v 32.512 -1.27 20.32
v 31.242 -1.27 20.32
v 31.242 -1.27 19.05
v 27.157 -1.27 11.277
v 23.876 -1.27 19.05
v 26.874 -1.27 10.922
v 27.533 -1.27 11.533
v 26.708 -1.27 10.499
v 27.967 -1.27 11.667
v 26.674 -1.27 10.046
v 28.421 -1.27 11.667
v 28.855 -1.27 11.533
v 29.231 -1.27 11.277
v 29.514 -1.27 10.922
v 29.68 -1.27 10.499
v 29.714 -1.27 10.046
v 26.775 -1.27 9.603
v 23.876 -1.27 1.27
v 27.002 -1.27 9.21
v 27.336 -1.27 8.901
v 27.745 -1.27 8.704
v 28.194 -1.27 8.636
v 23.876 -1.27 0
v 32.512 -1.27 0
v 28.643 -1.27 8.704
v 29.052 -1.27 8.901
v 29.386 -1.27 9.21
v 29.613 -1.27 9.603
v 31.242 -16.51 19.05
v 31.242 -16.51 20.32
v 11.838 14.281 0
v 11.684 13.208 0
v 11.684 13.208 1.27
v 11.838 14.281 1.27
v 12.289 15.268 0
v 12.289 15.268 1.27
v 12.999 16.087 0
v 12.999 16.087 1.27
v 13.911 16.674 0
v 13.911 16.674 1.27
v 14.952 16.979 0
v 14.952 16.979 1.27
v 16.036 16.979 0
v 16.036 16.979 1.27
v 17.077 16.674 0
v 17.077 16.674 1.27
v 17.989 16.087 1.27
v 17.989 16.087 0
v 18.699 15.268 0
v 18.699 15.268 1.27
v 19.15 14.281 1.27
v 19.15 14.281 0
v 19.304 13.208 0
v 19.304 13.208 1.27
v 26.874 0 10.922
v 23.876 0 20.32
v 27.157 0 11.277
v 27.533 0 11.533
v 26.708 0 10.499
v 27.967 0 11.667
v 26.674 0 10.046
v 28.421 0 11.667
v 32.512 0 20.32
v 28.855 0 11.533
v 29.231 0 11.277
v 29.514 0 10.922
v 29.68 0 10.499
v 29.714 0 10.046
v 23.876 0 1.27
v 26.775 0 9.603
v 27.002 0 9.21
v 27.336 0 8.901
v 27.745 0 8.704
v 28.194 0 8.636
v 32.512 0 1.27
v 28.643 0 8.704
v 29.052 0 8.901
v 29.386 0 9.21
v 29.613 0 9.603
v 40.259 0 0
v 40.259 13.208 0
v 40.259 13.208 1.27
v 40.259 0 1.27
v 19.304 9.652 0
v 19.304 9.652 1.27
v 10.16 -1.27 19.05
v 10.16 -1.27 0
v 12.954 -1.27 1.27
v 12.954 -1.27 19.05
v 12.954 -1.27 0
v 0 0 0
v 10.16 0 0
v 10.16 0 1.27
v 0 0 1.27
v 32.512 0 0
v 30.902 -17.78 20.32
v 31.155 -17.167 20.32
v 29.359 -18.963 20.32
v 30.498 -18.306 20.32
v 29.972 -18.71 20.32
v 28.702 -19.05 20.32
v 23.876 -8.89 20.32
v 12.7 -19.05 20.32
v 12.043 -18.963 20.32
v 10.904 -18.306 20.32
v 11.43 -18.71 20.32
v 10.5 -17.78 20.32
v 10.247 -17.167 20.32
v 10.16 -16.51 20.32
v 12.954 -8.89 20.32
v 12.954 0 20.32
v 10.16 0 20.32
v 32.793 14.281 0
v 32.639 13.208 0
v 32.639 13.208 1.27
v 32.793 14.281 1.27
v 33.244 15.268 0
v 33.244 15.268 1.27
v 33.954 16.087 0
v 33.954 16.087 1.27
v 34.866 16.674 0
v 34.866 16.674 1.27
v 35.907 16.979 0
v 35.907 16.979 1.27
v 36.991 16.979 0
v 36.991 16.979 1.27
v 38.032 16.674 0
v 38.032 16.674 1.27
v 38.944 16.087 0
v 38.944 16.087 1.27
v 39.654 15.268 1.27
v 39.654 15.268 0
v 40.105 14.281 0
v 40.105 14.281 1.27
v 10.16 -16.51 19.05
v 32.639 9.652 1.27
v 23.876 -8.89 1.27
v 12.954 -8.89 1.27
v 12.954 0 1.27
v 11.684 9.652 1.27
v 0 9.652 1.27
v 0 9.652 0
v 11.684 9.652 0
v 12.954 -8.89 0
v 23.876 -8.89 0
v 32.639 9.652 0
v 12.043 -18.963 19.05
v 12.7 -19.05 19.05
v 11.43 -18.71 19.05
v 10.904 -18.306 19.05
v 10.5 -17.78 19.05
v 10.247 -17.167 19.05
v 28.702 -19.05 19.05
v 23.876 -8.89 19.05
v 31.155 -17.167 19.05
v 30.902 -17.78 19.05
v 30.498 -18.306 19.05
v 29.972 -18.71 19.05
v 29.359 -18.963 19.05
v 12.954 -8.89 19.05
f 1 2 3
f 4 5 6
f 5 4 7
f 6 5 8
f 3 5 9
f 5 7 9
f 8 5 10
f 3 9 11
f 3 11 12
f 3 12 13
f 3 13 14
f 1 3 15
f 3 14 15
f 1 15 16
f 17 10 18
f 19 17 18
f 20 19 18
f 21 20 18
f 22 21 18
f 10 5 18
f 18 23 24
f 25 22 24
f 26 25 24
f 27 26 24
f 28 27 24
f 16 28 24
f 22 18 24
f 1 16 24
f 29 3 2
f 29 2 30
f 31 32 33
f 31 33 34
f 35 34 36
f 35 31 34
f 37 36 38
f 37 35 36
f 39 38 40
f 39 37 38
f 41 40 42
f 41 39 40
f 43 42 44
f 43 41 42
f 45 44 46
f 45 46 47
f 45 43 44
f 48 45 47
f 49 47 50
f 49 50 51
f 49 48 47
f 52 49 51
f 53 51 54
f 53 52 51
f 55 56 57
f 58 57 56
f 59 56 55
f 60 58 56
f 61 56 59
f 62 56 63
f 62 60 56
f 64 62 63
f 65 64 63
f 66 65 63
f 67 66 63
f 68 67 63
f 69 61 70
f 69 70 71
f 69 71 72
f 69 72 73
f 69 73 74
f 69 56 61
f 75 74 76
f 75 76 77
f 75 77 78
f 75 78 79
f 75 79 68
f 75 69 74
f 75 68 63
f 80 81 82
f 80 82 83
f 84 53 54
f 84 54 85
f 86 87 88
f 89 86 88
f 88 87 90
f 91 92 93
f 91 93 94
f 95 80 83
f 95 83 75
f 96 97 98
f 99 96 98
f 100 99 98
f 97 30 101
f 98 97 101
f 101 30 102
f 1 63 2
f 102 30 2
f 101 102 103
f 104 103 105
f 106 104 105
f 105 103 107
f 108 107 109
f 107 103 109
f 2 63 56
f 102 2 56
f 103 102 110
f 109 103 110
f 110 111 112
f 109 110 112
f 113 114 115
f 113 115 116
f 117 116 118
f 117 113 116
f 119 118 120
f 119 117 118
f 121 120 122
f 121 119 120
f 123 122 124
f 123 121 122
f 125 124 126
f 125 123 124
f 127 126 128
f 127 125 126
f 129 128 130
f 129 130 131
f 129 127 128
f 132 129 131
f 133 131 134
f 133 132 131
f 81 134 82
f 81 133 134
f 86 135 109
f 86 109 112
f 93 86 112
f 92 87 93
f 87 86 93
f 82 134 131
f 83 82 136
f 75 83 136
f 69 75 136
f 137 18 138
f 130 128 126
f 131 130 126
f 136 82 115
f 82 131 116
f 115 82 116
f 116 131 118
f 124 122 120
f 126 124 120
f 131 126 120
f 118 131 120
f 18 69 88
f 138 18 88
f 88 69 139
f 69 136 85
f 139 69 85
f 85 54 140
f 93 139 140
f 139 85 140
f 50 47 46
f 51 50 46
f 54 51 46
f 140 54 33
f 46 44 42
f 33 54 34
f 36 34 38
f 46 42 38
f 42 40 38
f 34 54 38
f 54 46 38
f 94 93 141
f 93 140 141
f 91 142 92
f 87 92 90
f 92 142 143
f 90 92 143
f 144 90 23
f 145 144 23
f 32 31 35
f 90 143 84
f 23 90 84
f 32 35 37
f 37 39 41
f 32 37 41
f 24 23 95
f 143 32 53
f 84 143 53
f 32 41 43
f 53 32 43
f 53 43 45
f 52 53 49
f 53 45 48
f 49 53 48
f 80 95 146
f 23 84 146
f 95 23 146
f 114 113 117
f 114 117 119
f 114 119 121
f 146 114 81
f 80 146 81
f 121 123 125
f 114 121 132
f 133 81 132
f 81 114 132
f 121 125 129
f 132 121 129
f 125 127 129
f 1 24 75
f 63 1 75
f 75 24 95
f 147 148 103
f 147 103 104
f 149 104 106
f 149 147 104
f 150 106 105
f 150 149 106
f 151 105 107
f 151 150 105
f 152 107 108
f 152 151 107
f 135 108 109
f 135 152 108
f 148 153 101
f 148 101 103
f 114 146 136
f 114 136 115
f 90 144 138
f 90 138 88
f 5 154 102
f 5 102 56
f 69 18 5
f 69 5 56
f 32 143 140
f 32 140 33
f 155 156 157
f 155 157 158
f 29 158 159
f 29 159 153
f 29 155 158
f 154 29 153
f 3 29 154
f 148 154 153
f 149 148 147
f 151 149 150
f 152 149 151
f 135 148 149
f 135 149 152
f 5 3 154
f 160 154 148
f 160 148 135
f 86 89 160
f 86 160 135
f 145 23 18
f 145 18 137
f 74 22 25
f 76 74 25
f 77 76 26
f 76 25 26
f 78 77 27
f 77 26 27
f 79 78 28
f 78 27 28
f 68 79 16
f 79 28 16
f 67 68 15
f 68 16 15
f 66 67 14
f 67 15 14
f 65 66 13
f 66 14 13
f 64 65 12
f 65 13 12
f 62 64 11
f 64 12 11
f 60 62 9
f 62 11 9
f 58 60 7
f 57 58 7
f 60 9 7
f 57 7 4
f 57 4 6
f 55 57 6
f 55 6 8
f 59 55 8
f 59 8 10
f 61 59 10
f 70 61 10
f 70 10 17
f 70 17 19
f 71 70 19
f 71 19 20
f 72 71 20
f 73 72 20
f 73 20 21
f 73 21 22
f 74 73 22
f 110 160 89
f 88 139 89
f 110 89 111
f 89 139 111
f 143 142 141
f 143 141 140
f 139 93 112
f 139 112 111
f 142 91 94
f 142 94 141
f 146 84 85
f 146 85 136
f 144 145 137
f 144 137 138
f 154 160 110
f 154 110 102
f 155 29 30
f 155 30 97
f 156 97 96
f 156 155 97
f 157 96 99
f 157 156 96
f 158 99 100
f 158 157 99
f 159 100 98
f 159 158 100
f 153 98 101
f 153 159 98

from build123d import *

# Parameters (mm, degrees)
BOSS_EXTRUDE1_DEPTH = 1.27
SKETCH4_W           = 8.636
SKETCH4_H           = 1.27
SKETCH4_W_2         = 2.794
BOSS_EXTRUDE2_DEPTH = 20.32
SKETCH5_W           = 2.794
SKETCH5_H           = 1.27
SKETCH5_W_2         = 7.366
BOSS_EXTRUDE3_DEPTH = 7.62
BOSS_EXTRUDE4_DEPTH = 1.27
SKETCH7_R           = 1.524
CUT_EXTRUDE1_DEPTH  = 49.663543079


with BuildPart() as part:
    # Sketch1 → Boss-Extrude1 (new body)
    with BuildSketch(Plane.XY):
        with BuildLine():
            Line((0, 0), (0, 9.652))
            Line((0, 9.652), (11.684, 9.652))
            Line((11.684, 9.652), (11.684, 13.208))
            ThreePointArc((11.684, 13.208), (15.494, 17.018), (19.304, 13.208))
            Line((19.304, 13.208), (19.304, 9.652))
            Line((19.304, 9.652), (32.639, 9.652))
            Line((32.639, 9.652), (32.639, 13.208))
            ThreePointArc((32.639, 13.208), (36.449, 17.018), (40.259, 13.208))
            Line((40.259, 13.208), (40.259, 9.652))
            Line((40.259, 9.652), (40.259, 0))
            Line((40.259, 0), (23.876, 0))
            Line((23.876, 0), (23.876, -8.89))
            Line((23.876, -8.89), (12.954, -8.89))
            Line((12.954, -8.89), (12.954, 0))
            Line((12.954, 0), (0, 0))
        make_face()
    extrude(amount=BOSS_EXTRUDE1_DEPTH)

    # Sketch4 → Boss-Extrude2 (add)
    with BuildSketch(Plane.XY):
        with Locations((28.194, -0.635)):
            Rectangle(SKETCH4_W, SKETCH4_H)
        with Locations((11.557, -0.635)):
            Rectangle(SKETCH4_W_2, SKETCH4_H)
    extrude(amount=BOSS_EXTRUDE2_DEPTH)

    # Sketch5 → Boss-Extrude3 (add)
    with BuildSketch(Plane.XZ.offset(1.27)):
        with Locations((11.557, 19.685)):
            Rectangle(SKETCH5_W, SKETCH5_H)
        with Locations((27.559, 19.685)):
            Rectangle(SKETCH5_W_2, SKETCH5_H)
    extrude(amount=BOSS_EXTRUDE3_DEPTH)

    # Sketch6 → Boss-Extrude4 (add)
    with BuildSketch(Plane(origin=(0, 0, 19.05), x_dir=(-1, 0, 0), z_dir=(0, 0, -1))):
        with BuildLine():
            Line((-10.16, -8.89), (-31.242, -8.89))
            Line((-31.242, -8.89), (-31.242, -16.51))
            ThreePointArc((-31.242, -16.51), (-30.498051224, -18.306051224), (-28.702, -19.05))
            Line((-28.702, -19.05), (-12.7, -19.05))
            ThreePointArc((-12.7, -19.05), (-10.903948776, -18.306051224), (-10.16, -16.51))
            Line((-10.16, -16.51), (-10.16, -8.89))
        make_face()
    extrude(amount=-BOSS_EXTRUDE4_DEPTH)

    # Sketch7 → Cut-Extrude1 (cut, through all)
    with BuildSketch(Plane.XZ.offset(1.27)):
        with Locations(Location((28.194, 10.16, 0), (0, 0, 270))):
            Circle(SKETCH7_R)
    extrude(amount=-CUT_EXTRUDE1_DEPTH, mode=Mode.SUBTRACT)


solid = part.part
